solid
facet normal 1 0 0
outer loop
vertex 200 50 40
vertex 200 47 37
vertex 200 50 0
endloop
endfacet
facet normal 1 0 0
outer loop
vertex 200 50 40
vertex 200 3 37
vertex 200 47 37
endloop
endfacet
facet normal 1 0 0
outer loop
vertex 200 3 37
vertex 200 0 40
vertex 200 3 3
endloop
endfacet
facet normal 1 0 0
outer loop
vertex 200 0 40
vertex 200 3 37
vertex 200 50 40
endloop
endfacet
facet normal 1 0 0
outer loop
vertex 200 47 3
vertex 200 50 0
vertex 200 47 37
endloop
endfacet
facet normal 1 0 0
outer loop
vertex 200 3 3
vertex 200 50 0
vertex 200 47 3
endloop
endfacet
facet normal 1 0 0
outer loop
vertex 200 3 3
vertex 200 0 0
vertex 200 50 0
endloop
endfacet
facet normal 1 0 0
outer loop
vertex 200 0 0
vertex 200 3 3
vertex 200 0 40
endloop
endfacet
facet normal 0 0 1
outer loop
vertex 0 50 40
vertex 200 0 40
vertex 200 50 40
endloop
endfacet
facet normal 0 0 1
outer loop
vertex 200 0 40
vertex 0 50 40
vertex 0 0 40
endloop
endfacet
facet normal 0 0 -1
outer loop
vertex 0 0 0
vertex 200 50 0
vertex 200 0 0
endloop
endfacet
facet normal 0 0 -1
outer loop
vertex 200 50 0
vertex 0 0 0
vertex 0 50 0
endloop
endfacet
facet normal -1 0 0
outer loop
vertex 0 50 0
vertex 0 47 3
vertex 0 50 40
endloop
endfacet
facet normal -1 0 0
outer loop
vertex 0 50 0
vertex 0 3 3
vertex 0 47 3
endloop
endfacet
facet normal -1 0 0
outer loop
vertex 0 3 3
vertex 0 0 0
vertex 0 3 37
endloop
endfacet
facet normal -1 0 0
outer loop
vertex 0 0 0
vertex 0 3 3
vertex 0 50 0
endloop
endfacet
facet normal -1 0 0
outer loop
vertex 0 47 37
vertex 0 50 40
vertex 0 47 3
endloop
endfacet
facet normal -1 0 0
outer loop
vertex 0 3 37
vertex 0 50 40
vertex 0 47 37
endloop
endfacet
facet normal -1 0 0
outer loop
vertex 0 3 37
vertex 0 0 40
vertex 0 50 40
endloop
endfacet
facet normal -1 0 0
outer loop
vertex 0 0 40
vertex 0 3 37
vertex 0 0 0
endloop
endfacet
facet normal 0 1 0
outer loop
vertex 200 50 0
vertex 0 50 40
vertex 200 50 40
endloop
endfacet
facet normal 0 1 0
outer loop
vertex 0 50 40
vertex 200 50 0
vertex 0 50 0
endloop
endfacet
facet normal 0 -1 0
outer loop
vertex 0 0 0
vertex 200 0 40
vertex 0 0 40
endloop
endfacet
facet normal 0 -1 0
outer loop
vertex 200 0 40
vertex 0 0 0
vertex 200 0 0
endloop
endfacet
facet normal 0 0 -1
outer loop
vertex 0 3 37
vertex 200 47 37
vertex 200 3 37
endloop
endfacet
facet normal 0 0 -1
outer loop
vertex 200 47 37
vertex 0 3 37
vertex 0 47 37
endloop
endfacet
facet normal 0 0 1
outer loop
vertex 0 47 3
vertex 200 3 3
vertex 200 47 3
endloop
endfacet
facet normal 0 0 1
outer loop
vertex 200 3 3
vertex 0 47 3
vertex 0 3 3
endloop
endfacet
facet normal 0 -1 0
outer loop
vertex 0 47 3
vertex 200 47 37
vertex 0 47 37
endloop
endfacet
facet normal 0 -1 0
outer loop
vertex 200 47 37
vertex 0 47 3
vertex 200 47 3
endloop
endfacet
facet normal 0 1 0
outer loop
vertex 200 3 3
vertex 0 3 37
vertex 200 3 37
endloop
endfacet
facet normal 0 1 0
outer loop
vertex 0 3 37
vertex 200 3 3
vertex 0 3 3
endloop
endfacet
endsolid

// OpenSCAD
$fn = 32;

// ----------------------------------------------------------------------
// Box beam: 200-250 mm hollow beam
// ----------------------------------------------------------------------

// --- parameters (mm) ---
beam_l = 200;             // beam length, X
beam_w = 50;              // beam width, Y
beam_h = 40;              // beam height, Z
wall = 3;                 // wall thickness

difference() {
  cube([beam_l, beam_w, beam_h]);
  translate([-1, wall, wall])
    cube([beam_l + 2, beam_w - 2 * wall, beam_h - 2 * wall]);
}
